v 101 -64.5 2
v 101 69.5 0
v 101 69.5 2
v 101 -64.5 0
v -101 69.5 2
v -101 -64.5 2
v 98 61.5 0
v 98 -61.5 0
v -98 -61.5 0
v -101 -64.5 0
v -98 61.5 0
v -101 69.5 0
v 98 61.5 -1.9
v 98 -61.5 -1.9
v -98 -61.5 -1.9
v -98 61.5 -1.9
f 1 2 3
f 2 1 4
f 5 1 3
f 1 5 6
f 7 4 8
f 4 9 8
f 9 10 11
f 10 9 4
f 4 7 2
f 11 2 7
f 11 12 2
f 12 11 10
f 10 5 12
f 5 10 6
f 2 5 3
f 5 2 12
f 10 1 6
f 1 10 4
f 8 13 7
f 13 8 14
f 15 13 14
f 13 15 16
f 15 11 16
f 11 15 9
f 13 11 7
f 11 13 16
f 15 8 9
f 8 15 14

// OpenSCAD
// ==================================================================
// === PARAMETERS
// ==================================================================

// == Parameters for LCD
screen_width      = 202.00;
screen_height     = 134.00;
screen_thickness  = 2; 
screen_bevel      = [8, 3, 3, 3]; // top, right, bottom, left

// Derived paramers
// screen is not completely center in the panel at the top of the panel there is
// at bit more space; therefore the hole for the screen needs to move offset up
// first is left; second top
screen_offset     = [(screen_bevel[3]-screen_bevel[1])/2, 
    (screen_bevel[0]-screen_bevel[2])/2];
// Dimensions of bevel
screen_bwidth     = screen_width-screen_bevel[1]-screen_bevel[3];
screen_bheight    = screen_height-screen_bevel[0]-screen_bevel[2]; 



screen();

// ==================================================================
// === MODULE SCREENHOLE
// ==================================================================
// Hole that needs to be in model for LCD screen to fit

module screenhole(height1 = 20, height2 = 20) {
   translate([screen_offset[0], screen_offset[1], 0])
      ccube([screen_width, screen_height, height1]);
   translate([0, 0, -height2+0.1])
      ccube([screen_bwidth, screen_bheight, height2]);
}


// ==================================================================
// === MODULE SCREEN
// ==================================================================
// Dummy of LCD screen

module screen() {
   color("pink")
      translate([screen_offset[0], screen_offset[1], 0])
      ccube([screen_width, screen_height, screen_thickness]);
   color("black") 
      translate([0, 0, -screen_thickness+0.1])
      ccube([screen_bwidth, screen_bheight, screen_thickness]);
}


// ==================================================================
// === MODULE CCUBE
// ==================================================================
// x-y centred cube

module ccube(dim) {
   translate([-dim[0]/2, -dim[1]/2, 0])
      cube(dim);
}
